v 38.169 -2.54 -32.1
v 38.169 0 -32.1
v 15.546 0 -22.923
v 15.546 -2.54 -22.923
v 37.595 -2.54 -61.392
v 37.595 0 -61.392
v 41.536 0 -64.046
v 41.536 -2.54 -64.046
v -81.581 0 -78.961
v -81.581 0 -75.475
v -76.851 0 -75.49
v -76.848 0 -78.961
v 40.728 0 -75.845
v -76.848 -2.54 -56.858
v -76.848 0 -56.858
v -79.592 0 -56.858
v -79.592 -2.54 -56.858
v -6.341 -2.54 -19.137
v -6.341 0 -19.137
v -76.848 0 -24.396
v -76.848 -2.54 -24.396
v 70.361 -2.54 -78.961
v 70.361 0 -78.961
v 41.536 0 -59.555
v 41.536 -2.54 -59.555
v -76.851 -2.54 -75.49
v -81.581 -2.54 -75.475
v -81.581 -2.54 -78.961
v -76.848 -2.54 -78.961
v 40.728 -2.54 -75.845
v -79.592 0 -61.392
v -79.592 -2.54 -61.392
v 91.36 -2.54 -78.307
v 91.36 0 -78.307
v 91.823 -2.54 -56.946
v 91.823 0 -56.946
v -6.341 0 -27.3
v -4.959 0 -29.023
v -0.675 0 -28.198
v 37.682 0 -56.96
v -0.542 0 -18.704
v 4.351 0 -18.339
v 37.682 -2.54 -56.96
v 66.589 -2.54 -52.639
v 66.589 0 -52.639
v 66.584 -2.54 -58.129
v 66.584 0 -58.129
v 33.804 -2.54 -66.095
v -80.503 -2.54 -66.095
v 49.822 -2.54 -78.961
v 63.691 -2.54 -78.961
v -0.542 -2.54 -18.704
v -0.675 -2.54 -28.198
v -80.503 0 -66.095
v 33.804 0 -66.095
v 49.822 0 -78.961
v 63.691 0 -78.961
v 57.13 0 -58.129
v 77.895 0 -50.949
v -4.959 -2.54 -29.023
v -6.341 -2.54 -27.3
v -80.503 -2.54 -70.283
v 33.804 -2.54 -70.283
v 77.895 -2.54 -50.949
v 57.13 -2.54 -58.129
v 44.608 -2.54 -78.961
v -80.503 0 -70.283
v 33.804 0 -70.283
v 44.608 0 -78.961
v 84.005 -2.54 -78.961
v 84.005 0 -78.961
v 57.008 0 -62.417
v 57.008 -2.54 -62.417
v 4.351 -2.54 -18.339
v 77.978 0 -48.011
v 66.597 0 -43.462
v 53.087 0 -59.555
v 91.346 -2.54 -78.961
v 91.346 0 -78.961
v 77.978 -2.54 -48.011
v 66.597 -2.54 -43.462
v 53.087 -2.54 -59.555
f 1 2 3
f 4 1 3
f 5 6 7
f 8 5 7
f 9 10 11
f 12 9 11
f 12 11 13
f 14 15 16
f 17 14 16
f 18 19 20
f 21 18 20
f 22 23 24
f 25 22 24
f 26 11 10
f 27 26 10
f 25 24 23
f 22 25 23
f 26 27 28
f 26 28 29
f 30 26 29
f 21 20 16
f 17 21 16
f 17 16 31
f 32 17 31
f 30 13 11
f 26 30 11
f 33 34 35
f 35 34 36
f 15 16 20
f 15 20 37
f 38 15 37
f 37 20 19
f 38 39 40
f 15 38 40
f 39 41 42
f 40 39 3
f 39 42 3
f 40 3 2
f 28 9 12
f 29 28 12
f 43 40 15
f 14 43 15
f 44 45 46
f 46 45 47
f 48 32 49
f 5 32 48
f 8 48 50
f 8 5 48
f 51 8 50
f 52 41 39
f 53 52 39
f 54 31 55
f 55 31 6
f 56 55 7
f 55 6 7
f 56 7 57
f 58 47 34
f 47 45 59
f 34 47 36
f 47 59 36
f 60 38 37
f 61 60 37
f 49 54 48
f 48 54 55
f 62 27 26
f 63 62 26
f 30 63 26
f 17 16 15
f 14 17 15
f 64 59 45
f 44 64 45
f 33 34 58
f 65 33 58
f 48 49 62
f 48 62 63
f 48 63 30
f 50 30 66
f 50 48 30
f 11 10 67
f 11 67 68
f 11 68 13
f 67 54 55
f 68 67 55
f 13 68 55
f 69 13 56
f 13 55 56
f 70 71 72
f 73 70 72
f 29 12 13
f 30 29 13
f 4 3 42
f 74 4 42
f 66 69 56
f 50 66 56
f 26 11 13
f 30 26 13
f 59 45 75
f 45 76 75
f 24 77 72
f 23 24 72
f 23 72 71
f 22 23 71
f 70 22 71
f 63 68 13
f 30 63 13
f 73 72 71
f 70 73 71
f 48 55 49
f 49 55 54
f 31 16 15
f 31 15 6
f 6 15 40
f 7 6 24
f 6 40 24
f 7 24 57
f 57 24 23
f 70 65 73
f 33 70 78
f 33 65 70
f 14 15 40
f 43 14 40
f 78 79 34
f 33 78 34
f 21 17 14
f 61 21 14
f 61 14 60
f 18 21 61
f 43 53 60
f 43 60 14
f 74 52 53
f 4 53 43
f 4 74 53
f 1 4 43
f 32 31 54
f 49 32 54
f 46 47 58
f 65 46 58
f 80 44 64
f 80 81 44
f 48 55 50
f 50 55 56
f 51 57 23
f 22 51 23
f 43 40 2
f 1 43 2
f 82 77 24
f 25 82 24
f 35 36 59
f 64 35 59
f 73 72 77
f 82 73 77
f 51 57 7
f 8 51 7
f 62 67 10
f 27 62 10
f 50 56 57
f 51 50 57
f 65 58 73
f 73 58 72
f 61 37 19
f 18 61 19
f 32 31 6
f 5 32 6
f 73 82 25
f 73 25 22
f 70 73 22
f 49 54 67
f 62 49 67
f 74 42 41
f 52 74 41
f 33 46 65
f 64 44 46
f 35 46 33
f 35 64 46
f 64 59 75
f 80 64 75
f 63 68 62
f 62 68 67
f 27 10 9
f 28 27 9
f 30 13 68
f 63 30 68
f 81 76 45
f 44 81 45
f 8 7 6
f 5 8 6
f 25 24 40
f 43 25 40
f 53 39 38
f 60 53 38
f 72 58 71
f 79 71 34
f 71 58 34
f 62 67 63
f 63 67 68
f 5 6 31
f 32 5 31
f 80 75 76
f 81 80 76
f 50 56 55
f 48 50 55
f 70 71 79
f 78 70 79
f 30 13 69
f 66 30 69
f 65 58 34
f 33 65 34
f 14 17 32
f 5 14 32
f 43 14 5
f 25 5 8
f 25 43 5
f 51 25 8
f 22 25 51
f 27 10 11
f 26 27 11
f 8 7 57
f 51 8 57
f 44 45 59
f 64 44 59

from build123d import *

# Parameters (mm, degrees)
F2_DEPTH = 2.54
F3_DEPTH = 2.54
F4_DEPTH = 2.54


with BuildPart() as f2:
    # F1 (on Front) → F2 (new body)
    with BuildSketch(Plane.XZ):
        Polygon((-81.5809369087, -75.475230813), (-81.5809369087, -78.9611507207), (-76.8478065729, -78.9611507207), (40.7279980952, -75.8449060952), (-76.8508296104, -75.489527428), align=None)
    extrude(amount=F2_DEPTH)


with BuildPart() as f2b:
    # F1 (on Front) → F2, piece 2 (new body)
    with BuildSketch(Plane.XZ):
        Polygon((-80.502524972, -66.0951957107), (-80.502524972, -70.2834948897), (33.8043898155, -70.2834948897), (33.8043898155, -66.0951957107), (-76.8478065729, -66.0951957107), align=None)
        Polygon((40.7279980952, -75.8449060952), (44.6075272818, -78.9611507207), (49.8216971755, -78.9611507207), (33.8043898155, -66.0951957107), (33.8043898155, -70.2834948897), align=None)
    extrude(amount=F2_DEPTH)


with BuildPart() as f2c:
    # F1 (on Front) → F2, piece 3 (new body)
    with BuildSketch(Plane.XZ):
        Polygon((-79.5916989446, -56.857869029), (-79.5916989446, -61.3922838997), (37.5950161402, -61.3922838997), (37.6818398776, -56.9604443388), (-76.8478065729, -56.857869029), align=None)
        Polygon((70.3608468175, -78.9611507207), (41.5360555053, -59.5552437007), (37.6818398776, -56.9604443388), (37.5950161402, -61.3922838997), (41.5360555053, -64.045536187), (63.6911382739, -78.9611507207), align=None)
    extrude(amount=F2_DEPTH)


with BuildPart() as f2d:
    # F1 (on Front) → F2, piece 4 (new body)
    with BuildSketch(Plane.XZ):
        Polygon((84.0048193932, -78.9611507207), (91.3462505137, -78.9611507207), (91.3604190266, -78.3069566897), (57.1301339189, -58.1292634916), (57.0081882179, -62.4165274203), align=None)
    extrude(amount=F2_DEPTH)


with BuildPart() as f3:
    # F1 (on Front) → F3 (new body)
    with BuildSketch(Plane.XZ):
        Polygon((-80.502524972, -70.2834948897), (-81.5809369087, -75.475230813), (-76.8508296104, -75.489527428), (40.7279980952, -75.8449060952), (33.8043898155, -70.2834948897), align=None)
    extrude(amount=F3_DEPTH)


with BuildPart() as f3b:
    # F1 (on Front) → F3, piece 2 (new body)
    with BuildSketch(Plane.XZ):
        Polygon((-79.5916989446, -61.3922838997), (-80.502524972, -66.0951957107), (-76.8478065729, -66.0951957107), (33.8043898155, -66.0951957107), (37.5950161402, -61.3922838997), align=None)
        Polygon((33.8043898155, -66.0951957107), (49.8216971755, -78.9611507207), (63.6911382739, -78.9611507207), (41.5360555053, -64.045536187), (37.5950161402, -61.3922838997), align=None)
    extrude(amount=F3_DEPTH)


with BuildPart() as f3c:
    # F1 (on Front) → F3, piece 3 (new body)
    with BuildSketch(Plane.XZ):
        Polygon((-76.8478065729, -56.857869029), (37.6818398776, -56.9604443388), (38.1688700454, -32.1004276141), (15.5460650954, -22.922502523), (4.3514288481, -18.339421304), (-0.5417316434, -18.7043742442), (-0.6745784194, -28.1983297318), (-4.9593360163, -29.0225408971), (-6.3414964825, -27.3002255708), (-6.3414964825, -19.1369456332), (-76.8478065729, -24.3956092745), (-79.5916989446, -56.857869029), align=None)
    extrude(amount=F3_DEPTH)


with BuildPart() as f3d:
    # F1 (on Front) → F3, piece 4 (new body)
    with BuildSketch(Plane.XZ):
        Polygon((57.0081882179, -62.4165274203), (53.0871674418, -59.5552437007), (41.5360555053, -59.5552437007), (70.3608468175, -78.9611507207), (84.0048193932, -78.9611507207), align=None)
    extrude(amount=F3_DEPTH)


with BuildPart() as f3e:
    # F1 (on Front) → F3, piece 5 (new body)
    with BuildSketch(Plane.XZ):
        Polygon((66.588590586, -52.6390053676), (77.8948708858, -50.9487634999), (77.9784285914, -48.0111122798), (66.596809519, -43.4622210421), align=None)
    extrude(amount=F3_DEPTH)


with BuildPart() as f4:
    # F1 (on Front) → F4 (new body)
    with BuildSketch(Plane.XZ):
        Polygon((57.1301339189, -58.1292634916), (91.3604190266, -78.3069566897), (91.8230438345, -56.9464661404), (86.9714392032, -54.8572845934), (77.8948708858, -50.9487634999), (66.588590586, -52.6390053676), (66.5836733882, -58.1292634916), align=None)
    extrude(amount=F4_DEPTH)


solid = Compound([f2.part, f2b.part, f2c.part, f2d.part, f3.part, f3b.part, f3c.part, f3d.part, f3e.part, f4.part])
